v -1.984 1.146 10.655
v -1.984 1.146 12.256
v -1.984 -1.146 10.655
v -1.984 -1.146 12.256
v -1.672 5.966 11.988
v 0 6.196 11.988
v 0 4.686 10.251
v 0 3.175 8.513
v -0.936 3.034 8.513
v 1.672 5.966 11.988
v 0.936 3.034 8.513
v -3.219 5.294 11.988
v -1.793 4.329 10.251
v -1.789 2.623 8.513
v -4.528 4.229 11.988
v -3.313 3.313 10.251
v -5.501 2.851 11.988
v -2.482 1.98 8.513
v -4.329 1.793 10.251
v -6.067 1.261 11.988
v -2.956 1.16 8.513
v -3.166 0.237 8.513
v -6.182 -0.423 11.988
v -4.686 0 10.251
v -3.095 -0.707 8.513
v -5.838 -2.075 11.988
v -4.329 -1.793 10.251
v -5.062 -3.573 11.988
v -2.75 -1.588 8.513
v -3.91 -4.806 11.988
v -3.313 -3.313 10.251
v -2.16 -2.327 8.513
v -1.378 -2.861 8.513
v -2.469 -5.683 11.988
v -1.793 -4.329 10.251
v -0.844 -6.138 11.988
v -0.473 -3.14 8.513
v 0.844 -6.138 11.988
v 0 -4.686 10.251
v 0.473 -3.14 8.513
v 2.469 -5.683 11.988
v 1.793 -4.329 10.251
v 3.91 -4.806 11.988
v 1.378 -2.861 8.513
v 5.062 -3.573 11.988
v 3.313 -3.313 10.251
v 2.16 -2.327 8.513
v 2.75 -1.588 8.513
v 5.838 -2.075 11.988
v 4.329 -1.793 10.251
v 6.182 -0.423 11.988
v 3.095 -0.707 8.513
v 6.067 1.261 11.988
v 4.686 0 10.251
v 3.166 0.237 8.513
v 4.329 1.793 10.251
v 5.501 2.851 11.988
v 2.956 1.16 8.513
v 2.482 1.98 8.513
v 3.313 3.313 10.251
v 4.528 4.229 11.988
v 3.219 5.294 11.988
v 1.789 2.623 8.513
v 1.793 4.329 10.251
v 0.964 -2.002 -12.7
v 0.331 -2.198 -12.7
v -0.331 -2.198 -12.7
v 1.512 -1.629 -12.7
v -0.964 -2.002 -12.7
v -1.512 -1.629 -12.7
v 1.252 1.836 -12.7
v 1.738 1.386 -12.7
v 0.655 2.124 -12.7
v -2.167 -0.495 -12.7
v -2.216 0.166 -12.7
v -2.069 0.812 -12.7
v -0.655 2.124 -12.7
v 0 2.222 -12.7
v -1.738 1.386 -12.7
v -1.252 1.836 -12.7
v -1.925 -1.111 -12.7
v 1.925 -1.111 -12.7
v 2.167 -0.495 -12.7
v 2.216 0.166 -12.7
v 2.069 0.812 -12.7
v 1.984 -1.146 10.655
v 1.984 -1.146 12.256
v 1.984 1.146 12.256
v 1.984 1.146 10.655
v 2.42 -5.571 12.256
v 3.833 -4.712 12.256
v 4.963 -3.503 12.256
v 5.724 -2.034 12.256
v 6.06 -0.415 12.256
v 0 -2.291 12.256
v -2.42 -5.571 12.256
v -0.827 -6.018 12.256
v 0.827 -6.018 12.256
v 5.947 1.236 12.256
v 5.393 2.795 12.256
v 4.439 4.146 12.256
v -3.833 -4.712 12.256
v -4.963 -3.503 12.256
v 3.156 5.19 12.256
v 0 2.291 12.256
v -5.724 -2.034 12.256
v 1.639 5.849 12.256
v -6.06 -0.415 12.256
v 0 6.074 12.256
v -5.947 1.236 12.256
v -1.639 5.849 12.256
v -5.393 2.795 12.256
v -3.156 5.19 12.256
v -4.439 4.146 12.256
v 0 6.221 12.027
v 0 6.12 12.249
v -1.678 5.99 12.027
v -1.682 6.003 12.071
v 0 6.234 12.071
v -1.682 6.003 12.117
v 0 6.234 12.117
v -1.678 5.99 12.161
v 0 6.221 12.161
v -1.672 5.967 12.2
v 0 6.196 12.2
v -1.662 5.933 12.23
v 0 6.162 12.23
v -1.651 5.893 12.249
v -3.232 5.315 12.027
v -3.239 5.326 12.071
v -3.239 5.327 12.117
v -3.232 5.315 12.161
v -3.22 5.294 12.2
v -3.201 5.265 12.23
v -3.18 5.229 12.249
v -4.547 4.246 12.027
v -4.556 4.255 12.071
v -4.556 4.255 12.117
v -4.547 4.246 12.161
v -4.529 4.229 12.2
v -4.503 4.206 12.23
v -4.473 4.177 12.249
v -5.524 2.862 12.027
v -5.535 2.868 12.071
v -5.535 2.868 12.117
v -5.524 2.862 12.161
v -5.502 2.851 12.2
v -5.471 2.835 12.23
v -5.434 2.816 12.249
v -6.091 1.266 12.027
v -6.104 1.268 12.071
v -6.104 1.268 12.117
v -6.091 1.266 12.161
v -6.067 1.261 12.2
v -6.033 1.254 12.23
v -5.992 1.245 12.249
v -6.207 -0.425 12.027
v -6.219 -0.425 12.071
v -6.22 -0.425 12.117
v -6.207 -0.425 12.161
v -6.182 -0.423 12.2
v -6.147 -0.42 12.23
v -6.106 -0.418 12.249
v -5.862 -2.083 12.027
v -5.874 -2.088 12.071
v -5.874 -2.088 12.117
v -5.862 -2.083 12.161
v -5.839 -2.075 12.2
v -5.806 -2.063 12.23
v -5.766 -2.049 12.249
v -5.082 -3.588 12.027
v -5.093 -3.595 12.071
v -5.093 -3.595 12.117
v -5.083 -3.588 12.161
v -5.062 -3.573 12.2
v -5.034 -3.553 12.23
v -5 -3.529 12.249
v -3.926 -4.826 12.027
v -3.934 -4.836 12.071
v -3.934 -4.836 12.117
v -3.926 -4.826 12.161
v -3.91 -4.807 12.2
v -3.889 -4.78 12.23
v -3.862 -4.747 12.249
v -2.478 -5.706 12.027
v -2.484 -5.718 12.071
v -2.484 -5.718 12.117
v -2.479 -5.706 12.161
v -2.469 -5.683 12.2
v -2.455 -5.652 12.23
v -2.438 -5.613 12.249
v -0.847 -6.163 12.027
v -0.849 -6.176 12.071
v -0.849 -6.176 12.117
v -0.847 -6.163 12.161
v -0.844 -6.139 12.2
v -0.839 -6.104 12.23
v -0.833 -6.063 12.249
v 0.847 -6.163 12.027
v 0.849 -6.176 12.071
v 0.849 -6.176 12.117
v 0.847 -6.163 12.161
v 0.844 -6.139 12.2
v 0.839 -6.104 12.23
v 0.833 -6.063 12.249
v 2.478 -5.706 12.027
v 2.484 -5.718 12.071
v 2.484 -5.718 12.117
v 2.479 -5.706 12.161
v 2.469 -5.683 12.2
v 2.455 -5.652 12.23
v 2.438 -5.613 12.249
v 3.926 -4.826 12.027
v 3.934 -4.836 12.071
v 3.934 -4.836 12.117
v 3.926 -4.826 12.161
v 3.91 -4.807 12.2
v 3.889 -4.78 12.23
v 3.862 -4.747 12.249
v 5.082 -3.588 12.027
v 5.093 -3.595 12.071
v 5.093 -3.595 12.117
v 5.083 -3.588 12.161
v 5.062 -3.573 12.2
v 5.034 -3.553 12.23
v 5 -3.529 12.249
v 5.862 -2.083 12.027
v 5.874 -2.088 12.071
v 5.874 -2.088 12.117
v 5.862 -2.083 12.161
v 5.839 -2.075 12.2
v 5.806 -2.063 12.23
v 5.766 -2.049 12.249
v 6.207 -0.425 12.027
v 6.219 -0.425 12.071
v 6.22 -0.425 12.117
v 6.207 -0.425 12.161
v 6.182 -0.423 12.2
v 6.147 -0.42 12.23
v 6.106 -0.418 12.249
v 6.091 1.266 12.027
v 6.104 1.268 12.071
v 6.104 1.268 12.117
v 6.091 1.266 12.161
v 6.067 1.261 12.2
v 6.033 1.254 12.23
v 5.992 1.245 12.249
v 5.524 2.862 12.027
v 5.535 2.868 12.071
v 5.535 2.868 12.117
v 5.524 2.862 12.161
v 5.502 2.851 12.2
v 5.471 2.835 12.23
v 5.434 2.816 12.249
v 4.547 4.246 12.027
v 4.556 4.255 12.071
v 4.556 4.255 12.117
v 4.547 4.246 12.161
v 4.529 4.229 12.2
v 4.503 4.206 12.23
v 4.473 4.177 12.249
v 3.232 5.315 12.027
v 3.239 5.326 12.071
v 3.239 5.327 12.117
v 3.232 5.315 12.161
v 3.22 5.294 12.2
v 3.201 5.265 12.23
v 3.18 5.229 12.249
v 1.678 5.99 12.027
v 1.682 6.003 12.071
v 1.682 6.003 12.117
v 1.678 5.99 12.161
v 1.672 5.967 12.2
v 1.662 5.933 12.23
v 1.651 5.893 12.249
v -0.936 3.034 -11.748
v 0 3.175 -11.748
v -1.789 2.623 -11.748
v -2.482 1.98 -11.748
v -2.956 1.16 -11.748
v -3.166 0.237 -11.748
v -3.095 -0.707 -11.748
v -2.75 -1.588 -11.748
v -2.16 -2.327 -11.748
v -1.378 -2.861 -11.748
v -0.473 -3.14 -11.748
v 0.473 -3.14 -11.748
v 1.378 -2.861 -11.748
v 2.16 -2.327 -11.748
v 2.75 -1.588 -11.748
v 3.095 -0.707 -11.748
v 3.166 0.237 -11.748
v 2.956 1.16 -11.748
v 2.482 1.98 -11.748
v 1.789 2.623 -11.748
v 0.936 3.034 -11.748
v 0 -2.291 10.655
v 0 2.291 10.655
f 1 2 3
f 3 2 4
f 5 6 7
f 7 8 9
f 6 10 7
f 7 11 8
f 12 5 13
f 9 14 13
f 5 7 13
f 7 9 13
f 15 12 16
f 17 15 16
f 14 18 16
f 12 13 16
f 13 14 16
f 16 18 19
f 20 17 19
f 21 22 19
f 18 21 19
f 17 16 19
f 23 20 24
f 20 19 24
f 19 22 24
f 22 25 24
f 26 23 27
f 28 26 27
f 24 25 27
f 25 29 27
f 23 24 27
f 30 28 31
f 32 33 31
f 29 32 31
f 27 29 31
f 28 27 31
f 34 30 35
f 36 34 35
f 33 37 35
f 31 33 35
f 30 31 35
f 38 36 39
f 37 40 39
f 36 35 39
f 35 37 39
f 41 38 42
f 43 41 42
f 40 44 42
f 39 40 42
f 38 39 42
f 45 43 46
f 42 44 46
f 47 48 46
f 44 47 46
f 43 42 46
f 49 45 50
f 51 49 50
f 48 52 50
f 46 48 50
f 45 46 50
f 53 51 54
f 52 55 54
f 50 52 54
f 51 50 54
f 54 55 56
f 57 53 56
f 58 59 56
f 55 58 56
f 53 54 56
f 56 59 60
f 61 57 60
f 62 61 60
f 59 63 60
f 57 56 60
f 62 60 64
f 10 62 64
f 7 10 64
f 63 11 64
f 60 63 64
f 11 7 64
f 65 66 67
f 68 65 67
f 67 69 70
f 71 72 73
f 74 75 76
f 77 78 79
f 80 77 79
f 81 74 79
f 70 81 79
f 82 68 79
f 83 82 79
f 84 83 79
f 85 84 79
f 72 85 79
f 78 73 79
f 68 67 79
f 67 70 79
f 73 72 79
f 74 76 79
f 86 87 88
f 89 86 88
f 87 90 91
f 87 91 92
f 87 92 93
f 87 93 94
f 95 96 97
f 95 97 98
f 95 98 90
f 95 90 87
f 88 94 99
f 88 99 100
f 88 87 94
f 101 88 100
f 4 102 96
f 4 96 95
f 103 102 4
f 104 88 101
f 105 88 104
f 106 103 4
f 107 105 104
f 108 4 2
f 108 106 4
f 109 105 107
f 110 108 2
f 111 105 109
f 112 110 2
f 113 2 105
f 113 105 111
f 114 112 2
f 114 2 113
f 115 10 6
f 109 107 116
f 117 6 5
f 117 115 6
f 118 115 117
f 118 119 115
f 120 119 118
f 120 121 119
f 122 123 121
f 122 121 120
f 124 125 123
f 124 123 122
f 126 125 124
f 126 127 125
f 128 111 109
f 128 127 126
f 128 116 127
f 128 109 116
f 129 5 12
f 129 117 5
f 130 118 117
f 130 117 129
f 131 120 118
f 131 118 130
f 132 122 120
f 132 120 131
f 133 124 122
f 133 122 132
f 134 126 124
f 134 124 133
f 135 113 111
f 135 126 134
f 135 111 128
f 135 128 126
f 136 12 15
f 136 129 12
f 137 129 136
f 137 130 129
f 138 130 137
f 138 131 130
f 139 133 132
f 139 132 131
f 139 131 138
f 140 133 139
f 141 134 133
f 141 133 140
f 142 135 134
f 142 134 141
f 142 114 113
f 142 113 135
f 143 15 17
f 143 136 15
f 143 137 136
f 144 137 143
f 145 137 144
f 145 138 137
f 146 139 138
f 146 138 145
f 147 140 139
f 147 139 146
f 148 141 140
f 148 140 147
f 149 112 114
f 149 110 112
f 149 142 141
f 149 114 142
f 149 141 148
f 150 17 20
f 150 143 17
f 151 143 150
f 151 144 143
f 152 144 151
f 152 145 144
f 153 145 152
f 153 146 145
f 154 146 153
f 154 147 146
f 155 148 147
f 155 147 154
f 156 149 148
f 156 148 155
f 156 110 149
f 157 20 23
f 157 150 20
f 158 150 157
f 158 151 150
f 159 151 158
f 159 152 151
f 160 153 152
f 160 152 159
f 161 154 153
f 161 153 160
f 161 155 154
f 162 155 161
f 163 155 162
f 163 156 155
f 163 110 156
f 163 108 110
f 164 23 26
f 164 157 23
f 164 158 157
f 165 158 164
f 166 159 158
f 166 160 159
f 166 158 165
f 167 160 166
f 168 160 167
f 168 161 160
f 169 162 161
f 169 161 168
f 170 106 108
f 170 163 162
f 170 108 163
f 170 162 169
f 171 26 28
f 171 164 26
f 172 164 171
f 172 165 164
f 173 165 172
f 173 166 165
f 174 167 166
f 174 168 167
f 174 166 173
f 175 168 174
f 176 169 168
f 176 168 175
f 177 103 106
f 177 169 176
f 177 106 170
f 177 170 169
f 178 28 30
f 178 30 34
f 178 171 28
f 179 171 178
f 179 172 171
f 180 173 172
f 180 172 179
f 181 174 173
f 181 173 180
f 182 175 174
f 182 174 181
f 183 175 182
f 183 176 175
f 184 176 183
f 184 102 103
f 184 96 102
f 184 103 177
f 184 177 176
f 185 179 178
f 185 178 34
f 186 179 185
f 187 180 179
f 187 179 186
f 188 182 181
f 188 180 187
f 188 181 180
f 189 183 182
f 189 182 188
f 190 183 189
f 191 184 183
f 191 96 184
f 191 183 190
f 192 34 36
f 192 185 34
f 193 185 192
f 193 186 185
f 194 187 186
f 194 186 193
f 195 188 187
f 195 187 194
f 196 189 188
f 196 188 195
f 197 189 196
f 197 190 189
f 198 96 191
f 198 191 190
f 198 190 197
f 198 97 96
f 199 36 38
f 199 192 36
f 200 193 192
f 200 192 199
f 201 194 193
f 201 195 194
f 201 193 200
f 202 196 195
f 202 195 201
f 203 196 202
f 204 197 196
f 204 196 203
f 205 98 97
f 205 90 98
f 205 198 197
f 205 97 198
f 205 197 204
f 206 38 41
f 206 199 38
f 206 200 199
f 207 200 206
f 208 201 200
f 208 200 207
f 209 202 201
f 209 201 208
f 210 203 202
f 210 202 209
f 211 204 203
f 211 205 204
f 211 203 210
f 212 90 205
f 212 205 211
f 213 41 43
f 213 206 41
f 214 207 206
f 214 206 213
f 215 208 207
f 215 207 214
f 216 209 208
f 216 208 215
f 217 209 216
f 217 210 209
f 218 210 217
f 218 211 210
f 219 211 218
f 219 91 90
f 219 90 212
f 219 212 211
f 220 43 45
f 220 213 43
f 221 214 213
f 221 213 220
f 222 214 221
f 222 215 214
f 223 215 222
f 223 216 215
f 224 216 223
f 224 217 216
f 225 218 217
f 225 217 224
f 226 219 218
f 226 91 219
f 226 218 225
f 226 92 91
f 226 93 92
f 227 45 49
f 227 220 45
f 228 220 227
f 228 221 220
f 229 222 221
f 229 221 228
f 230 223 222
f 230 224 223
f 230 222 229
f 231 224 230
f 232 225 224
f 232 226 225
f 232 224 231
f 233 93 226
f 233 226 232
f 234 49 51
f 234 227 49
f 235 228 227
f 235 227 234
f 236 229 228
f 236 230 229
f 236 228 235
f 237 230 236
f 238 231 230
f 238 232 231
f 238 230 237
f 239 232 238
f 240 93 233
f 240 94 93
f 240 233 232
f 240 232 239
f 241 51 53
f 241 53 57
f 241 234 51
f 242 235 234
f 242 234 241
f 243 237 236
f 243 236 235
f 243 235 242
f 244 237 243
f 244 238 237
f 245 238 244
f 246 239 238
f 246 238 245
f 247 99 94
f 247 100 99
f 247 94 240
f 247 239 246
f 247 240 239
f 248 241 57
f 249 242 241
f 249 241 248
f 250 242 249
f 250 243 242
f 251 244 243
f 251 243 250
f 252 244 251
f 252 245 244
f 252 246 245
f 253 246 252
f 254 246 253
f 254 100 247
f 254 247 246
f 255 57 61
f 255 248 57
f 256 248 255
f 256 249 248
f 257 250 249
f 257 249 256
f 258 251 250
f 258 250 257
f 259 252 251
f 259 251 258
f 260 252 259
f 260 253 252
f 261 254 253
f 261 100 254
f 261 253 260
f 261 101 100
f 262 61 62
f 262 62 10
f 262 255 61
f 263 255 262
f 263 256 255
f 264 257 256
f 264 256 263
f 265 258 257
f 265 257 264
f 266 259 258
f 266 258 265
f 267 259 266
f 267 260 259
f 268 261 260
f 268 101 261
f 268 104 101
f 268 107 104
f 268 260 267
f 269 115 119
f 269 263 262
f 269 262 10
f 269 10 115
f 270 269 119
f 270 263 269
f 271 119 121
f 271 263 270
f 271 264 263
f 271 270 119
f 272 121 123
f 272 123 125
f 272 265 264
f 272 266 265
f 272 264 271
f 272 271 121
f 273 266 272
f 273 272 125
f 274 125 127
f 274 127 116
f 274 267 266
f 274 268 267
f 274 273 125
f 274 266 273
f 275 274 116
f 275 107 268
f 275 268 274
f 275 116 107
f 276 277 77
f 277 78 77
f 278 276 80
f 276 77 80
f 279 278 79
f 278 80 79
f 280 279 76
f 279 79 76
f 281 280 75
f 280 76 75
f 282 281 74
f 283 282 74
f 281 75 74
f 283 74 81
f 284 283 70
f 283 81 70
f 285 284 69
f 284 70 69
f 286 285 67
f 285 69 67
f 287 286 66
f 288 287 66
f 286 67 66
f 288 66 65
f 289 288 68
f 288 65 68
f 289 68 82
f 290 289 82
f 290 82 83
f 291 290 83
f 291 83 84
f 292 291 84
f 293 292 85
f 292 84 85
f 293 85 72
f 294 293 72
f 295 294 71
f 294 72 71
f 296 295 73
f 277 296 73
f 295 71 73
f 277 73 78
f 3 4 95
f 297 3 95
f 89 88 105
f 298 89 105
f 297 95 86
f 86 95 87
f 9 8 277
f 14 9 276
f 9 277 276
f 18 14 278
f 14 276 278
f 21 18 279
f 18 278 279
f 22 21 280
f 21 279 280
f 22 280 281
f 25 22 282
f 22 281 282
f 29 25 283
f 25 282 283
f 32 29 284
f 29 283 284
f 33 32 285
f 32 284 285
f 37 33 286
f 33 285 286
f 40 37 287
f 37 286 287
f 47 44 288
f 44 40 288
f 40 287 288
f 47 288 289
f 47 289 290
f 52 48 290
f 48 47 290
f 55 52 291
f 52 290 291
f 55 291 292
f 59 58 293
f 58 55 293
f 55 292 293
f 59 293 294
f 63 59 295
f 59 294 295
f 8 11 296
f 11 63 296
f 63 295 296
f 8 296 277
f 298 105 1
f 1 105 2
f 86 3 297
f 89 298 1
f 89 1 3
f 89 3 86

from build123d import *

# Parameters (mm, degrees)
SKETCH10_R         = 2.291358881
CUT_EXTRUDE2_DEPTH = 2.0447
CUT_EXTRUDE2_DRAFT = -45
CUT_EXTRUDE1_DEPTH = 2.0447


with BuildPart() as part:
    # Sketch2 → Revolve1 (revolve)
    with BuildSketch(Plane(origin=(0, 0, 0), x_dir=(0, 0, -1), z_dir=(1, 0, 0))):
        Polygon((-12.618212, 6.7437), (-8.512892265, 3.175), (11.7475, 3.175), (12.7, 2.2225), (12.7, 0), (-12.7, 0), (-12.7, 6.7437), align=None)
    revolve(axis=Axis((0, 0, -12.7), (0, 0, 1)))


with BuildPart() as cut_extrude2_tool:
    # Sketch10 → Cut-Extrude2 (with draft: the straight prism first)
    with BuildSketch(Plane.XY.offset(12.7)):
        Circle(SKETCH10_R)
    extrude(amount=-CUT_EXTRUDE2_DEPTH)
    # Cut-Extrude2: the draft: its side faces are tilted about the plane it starts from
    cut_extrude2_sides = [cut_extrude2_tool.faces().sort_by_distance(p)[0] for p in [
        (-2.291358881, 0, 11.67765),
    ]]
    draft(cut_extrude2_sides, Plane.XY.offset(12.7), CUT_EXTRUDE2_DRAFT)


with BuildPart() as part_1:
    add(part.part)

    # Cut-Extrude2: cut by cut_extrude2_tool
    add(cut_extrude2_tool.part, mode=Mode.SUBTRACT)

    # Sketch9 → Cut-Extrude1 (cut)
    with BuildSketch(Plane.XY.offset(12.7)):
        Polygon((1.984375, -1.14567944), (1.984375, 1.14567944), (0, 2.291358881), (-1.984375, 1.14567944), (-1.984375, -1.14567944), (0, -2.291358881), align=None)
    extrude(amount=-CUT_EXTRUDE1_DEPTH, mode=Mode.SUBTRACT)


with BuildPart() as body_2:
    # Split1: the piece on the far side of the plane
    add(part_1.part)
    split(bisect_by=Plane.XY.offset(8.512892265), keep=Keep.BOTTOM)


with BuildPart() as part_2:
    add(part_1.part)

    # Split1
    split(bisect_by=Plane.XY.offset(8.512892265), keep=Keep.TOP)

    add(body_2.part)  # Boss-Extrude2 merges body 2
    # Boss-Extrude2 cone 1 section (through the dimple's axis) → Boss-Extrude2 (revolve)
    with BuildSketch(Plane(origin=(0, 0, 8.512892265), x_dir=(0, -1, 0), z_dir=(1, 0, 0))):
        Polygon((0, 0), (3.175, 0), (0, 8.723240807), align=None)
    revolve(axis=Axis((0, 0, 8.512892265), (0, 0, -1)))

    # Sketch12 → Cut-Revolve1 (revolve, cut)
    with BuildSketch(Plane(origin=(0, 0, 0), x_dir=(0, 0, -1), z_dir=(1, 0, 0))):
        with BuildLine():
            Line((-12.7, 0), (-12.7, 6.814797224))
            Line((-12.7, 6.814797224), (-11.988296252, 6.196122595))
            ThreePointArc((-11.988296252, 6.196122595), (-12.161061241, 6.221172326), (-12.2555, 6.074350831))
            Line((-12.2555, 6.074350831), (-12.2555, 0))
            Line((-12.2555, 0), (-12.7, 0))
        make_face()
    revolve(axis=Axis((0, 0, 0), (0, 0, 1)), mode=Mode.SUBTRACT)


solid = part_2.part
